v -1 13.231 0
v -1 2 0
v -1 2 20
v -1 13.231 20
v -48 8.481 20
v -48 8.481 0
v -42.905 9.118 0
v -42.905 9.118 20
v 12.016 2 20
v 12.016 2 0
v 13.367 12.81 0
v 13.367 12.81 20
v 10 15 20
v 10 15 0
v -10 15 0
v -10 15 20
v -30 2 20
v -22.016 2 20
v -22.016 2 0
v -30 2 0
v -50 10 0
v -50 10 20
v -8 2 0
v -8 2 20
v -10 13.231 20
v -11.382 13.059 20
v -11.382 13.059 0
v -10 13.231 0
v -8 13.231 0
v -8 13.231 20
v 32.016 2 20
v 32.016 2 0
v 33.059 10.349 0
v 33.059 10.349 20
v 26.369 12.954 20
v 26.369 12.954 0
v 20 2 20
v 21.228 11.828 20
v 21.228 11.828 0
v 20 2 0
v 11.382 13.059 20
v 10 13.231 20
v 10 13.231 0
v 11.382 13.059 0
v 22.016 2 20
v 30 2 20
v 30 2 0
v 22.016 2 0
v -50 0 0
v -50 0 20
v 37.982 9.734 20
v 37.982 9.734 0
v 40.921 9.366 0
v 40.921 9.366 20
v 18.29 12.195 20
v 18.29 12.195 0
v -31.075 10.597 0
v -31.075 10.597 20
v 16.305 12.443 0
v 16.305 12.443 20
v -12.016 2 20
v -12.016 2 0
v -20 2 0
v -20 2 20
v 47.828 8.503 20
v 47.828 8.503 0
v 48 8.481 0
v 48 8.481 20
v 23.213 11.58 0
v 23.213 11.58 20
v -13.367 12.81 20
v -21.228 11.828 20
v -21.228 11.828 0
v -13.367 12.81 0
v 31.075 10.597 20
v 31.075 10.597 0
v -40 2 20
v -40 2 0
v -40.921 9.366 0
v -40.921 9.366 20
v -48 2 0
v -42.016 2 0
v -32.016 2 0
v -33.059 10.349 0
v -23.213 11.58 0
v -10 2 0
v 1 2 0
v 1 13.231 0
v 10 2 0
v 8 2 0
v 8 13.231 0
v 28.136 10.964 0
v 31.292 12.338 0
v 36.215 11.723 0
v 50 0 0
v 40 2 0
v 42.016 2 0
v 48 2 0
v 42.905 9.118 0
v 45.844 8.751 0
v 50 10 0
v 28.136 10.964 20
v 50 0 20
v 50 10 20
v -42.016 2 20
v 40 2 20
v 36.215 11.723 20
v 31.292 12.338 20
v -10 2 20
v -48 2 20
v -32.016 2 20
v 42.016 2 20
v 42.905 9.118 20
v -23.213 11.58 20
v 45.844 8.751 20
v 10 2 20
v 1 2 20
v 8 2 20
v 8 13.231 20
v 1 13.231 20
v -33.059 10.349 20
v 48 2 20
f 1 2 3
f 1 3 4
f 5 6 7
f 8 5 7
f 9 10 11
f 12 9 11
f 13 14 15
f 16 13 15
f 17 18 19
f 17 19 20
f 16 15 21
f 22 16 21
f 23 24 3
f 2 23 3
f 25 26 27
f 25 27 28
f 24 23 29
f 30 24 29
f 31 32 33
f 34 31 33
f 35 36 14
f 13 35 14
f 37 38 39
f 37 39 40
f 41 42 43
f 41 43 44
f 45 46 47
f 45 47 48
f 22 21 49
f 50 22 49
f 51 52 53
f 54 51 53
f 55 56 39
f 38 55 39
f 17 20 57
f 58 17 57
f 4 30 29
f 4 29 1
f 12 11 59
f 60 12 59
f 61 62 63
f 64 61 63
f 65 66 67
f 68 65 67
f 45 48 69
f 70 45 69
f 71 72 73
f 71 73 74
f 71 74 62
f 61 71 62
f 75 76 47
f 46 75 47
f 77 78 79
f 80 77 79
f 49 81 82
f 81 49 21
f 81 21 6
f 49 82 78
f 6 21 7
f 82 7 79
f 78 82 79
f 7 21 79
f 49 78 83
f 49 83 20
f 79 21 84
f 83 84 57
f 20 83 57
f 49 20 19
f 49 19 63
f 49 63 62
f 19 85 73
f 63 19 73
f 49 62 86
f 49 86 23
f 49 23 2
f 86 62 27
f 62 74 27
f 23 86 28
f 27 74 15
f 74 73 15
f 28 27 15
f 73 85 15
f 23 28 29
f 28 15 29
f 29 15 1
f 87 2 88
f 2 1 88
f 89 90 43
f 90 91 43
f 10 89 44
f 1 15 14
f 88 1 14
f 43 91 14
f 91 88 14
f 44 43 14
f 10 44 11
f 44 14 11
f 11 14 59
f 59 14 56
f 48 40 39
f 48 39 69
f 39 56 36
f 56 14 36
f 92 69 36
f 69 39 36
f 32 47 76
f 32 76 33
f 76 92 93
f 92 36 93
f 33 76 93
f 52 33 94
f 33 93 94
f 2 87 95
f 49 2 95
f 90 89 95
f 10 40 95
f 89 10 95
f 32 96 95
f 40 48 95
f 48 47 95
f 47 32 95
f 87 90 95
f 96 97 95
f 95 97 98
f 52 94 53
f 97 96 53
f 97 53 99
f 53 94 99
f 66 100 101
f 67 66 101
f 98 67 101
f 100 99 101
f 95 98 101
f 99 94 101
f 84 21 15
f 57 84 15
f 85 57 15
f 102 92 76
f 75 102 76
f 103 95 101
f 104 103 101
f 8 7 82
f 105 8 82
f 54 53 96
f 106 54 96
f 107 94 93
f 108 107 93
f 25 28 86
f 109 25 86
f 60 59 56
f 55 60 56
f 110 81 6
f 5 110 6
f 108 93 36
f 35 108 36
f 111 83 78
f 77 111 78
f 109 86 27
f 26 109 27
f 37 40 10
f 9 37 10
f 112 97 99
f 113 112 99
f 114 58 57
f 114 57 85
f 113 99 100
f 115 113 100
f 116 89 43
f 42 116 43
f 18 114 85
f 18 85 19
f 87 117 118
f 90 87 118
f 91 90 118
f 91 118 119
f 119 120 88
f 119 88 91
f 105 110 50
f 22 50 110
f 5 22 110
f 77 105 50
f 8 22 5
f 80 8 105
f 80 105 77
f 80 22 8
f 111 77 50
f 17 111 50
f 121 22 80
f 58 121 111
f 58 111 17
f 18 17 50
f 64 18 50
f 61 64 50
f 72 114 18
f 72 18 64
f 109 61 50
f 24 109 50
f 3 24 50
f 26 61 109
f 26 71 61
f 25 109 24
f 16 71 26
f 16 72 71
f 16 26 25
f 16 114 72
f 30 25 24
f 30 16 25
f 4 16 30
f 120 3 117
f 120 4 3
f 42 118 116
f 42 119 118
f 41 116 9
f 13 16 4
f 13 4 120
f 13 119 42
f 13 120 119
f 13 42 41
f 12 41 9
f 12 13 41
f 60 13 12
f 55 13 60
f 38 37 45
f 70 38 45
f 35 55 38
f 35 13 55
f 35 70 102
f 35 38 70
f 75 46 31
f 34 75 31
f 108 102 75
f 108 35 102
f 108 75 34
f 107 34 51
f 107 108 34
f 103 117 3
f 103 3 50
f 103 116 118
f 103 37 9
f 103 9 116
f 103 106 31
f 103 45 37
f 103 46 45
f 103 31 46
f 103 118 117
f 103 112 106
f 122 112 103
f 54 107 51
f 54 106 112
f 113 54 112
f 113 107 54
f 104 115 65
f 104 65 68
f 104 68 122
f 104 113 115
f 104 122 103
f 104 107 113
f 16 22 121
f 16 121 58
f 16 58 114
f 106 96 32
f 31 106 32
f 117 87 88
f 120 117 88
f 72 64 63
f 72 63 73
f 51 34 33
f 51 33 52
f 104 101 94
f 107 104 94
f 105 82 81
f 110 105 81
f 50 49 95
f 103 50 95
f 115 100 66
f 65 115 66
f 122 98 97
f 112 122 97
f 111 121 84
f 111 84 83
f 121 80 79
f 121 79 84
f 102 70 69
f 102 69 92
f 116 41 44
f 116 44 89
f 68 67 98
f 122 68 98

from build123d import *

# Parameters (mm, degrees)
SKETCH1_W           = 7
SKETCH1_H           = 11.231344736
BOSS_EXTRUDE1_DEPTH = 20


with BuildPart() as part:
    # Sketch1 → Boss-Extrude1 (new body)
    with BuildSketch(Plane.XY):
        Polygon((50, 0), (50, 10), (36.215384615, 11.723076923), (31.292307692, 12.338461538), (26.369230769, 12.953846154), (10, 15), (-10, 15), (-50, 10), (-50, 0), align=None)
        Polygon((-42.015564437, 2), (-48, 2), (-48, 8.481344736), (-42.905336644, 9.118177656), align=None, mode=Mode.SUBTRACT)
        Polygon((-40.920780891, 9.366247125), (-33.059182798, 10.348946887), (-32.015564437, 2), (-40, 2), align=None, mode=Mode.SUBTRACT)
        Polygon((-31.074627044, 10.597016356), (-23.213028952, 11.579716117), (-22.015564437, 2), (-30, 2), align=None, mode=Mode.SUBTRACT)
        Polygon((-21.228473198, 11.827785587), (-13.366875106, 12.810485348), (-12.015564437, 2), (-20, 2), align=None, mode=Mode.SUBTRACT)
        Polygon((15, 2), (12.015564437, 2), (13.366875106, 12.810485348), (16.305396275, 12.443170202), (18.289952029, 12.195100733), (21.228473198, 11.827785587), (20, 2), (17.015564437, 2), align=None, mode=Mode.SUBTRACT)
        Polygon((47.828413567, 8.502793041), (48, 8.481344736), (48, 2), (47.015564437, 2), (45, 2), (42.015564437, 2), (42.905336644, 9.118177656), (45.843857814, 8.75086251), align=None, mode=Mode.SUBTRACT)
        Polygon((37.015564437, 2), (32.015564437, 2), (33.059182798, 10.348946887), (37.982259721, 9.733562271), (40.920780891, 9.366247125), (40, 2), align=None, mode=Mode.SUBTRACT)
        Polygon((27.015564437, 2), (22.015564437, 2), (23.213028952, 11.579716117), (28.136105875, 10.964331502), (31.074627044, 10.597016356), (30, 2), align=None, mode=Mode.SUBTRACT)
        Polygon((-10, 2), (-11.382319352, 13.058554817), (-10, 13.231344736), align=None, mode=Mode.SUBTRACT)
        with Locations((-4.5, 7.615672368)):
            Rectangle(SKETCH1_W, SKETCH1_H, mode=Mode.SUBTRACT)
        with Locations((4.5, 7.615672368)):
            Rectangle(SKETCH1_W, SKETCH1_H, mode=Mode.SUBTRACT)
        Polygon((10, 2), (10, 13.231344736), (11.382319352, 13.058554817), align=None, mode=Mode.SUBTRACT)
    extrude(amount=BOSS_EXTRUDE1_DEPTH)


solid = part.part
